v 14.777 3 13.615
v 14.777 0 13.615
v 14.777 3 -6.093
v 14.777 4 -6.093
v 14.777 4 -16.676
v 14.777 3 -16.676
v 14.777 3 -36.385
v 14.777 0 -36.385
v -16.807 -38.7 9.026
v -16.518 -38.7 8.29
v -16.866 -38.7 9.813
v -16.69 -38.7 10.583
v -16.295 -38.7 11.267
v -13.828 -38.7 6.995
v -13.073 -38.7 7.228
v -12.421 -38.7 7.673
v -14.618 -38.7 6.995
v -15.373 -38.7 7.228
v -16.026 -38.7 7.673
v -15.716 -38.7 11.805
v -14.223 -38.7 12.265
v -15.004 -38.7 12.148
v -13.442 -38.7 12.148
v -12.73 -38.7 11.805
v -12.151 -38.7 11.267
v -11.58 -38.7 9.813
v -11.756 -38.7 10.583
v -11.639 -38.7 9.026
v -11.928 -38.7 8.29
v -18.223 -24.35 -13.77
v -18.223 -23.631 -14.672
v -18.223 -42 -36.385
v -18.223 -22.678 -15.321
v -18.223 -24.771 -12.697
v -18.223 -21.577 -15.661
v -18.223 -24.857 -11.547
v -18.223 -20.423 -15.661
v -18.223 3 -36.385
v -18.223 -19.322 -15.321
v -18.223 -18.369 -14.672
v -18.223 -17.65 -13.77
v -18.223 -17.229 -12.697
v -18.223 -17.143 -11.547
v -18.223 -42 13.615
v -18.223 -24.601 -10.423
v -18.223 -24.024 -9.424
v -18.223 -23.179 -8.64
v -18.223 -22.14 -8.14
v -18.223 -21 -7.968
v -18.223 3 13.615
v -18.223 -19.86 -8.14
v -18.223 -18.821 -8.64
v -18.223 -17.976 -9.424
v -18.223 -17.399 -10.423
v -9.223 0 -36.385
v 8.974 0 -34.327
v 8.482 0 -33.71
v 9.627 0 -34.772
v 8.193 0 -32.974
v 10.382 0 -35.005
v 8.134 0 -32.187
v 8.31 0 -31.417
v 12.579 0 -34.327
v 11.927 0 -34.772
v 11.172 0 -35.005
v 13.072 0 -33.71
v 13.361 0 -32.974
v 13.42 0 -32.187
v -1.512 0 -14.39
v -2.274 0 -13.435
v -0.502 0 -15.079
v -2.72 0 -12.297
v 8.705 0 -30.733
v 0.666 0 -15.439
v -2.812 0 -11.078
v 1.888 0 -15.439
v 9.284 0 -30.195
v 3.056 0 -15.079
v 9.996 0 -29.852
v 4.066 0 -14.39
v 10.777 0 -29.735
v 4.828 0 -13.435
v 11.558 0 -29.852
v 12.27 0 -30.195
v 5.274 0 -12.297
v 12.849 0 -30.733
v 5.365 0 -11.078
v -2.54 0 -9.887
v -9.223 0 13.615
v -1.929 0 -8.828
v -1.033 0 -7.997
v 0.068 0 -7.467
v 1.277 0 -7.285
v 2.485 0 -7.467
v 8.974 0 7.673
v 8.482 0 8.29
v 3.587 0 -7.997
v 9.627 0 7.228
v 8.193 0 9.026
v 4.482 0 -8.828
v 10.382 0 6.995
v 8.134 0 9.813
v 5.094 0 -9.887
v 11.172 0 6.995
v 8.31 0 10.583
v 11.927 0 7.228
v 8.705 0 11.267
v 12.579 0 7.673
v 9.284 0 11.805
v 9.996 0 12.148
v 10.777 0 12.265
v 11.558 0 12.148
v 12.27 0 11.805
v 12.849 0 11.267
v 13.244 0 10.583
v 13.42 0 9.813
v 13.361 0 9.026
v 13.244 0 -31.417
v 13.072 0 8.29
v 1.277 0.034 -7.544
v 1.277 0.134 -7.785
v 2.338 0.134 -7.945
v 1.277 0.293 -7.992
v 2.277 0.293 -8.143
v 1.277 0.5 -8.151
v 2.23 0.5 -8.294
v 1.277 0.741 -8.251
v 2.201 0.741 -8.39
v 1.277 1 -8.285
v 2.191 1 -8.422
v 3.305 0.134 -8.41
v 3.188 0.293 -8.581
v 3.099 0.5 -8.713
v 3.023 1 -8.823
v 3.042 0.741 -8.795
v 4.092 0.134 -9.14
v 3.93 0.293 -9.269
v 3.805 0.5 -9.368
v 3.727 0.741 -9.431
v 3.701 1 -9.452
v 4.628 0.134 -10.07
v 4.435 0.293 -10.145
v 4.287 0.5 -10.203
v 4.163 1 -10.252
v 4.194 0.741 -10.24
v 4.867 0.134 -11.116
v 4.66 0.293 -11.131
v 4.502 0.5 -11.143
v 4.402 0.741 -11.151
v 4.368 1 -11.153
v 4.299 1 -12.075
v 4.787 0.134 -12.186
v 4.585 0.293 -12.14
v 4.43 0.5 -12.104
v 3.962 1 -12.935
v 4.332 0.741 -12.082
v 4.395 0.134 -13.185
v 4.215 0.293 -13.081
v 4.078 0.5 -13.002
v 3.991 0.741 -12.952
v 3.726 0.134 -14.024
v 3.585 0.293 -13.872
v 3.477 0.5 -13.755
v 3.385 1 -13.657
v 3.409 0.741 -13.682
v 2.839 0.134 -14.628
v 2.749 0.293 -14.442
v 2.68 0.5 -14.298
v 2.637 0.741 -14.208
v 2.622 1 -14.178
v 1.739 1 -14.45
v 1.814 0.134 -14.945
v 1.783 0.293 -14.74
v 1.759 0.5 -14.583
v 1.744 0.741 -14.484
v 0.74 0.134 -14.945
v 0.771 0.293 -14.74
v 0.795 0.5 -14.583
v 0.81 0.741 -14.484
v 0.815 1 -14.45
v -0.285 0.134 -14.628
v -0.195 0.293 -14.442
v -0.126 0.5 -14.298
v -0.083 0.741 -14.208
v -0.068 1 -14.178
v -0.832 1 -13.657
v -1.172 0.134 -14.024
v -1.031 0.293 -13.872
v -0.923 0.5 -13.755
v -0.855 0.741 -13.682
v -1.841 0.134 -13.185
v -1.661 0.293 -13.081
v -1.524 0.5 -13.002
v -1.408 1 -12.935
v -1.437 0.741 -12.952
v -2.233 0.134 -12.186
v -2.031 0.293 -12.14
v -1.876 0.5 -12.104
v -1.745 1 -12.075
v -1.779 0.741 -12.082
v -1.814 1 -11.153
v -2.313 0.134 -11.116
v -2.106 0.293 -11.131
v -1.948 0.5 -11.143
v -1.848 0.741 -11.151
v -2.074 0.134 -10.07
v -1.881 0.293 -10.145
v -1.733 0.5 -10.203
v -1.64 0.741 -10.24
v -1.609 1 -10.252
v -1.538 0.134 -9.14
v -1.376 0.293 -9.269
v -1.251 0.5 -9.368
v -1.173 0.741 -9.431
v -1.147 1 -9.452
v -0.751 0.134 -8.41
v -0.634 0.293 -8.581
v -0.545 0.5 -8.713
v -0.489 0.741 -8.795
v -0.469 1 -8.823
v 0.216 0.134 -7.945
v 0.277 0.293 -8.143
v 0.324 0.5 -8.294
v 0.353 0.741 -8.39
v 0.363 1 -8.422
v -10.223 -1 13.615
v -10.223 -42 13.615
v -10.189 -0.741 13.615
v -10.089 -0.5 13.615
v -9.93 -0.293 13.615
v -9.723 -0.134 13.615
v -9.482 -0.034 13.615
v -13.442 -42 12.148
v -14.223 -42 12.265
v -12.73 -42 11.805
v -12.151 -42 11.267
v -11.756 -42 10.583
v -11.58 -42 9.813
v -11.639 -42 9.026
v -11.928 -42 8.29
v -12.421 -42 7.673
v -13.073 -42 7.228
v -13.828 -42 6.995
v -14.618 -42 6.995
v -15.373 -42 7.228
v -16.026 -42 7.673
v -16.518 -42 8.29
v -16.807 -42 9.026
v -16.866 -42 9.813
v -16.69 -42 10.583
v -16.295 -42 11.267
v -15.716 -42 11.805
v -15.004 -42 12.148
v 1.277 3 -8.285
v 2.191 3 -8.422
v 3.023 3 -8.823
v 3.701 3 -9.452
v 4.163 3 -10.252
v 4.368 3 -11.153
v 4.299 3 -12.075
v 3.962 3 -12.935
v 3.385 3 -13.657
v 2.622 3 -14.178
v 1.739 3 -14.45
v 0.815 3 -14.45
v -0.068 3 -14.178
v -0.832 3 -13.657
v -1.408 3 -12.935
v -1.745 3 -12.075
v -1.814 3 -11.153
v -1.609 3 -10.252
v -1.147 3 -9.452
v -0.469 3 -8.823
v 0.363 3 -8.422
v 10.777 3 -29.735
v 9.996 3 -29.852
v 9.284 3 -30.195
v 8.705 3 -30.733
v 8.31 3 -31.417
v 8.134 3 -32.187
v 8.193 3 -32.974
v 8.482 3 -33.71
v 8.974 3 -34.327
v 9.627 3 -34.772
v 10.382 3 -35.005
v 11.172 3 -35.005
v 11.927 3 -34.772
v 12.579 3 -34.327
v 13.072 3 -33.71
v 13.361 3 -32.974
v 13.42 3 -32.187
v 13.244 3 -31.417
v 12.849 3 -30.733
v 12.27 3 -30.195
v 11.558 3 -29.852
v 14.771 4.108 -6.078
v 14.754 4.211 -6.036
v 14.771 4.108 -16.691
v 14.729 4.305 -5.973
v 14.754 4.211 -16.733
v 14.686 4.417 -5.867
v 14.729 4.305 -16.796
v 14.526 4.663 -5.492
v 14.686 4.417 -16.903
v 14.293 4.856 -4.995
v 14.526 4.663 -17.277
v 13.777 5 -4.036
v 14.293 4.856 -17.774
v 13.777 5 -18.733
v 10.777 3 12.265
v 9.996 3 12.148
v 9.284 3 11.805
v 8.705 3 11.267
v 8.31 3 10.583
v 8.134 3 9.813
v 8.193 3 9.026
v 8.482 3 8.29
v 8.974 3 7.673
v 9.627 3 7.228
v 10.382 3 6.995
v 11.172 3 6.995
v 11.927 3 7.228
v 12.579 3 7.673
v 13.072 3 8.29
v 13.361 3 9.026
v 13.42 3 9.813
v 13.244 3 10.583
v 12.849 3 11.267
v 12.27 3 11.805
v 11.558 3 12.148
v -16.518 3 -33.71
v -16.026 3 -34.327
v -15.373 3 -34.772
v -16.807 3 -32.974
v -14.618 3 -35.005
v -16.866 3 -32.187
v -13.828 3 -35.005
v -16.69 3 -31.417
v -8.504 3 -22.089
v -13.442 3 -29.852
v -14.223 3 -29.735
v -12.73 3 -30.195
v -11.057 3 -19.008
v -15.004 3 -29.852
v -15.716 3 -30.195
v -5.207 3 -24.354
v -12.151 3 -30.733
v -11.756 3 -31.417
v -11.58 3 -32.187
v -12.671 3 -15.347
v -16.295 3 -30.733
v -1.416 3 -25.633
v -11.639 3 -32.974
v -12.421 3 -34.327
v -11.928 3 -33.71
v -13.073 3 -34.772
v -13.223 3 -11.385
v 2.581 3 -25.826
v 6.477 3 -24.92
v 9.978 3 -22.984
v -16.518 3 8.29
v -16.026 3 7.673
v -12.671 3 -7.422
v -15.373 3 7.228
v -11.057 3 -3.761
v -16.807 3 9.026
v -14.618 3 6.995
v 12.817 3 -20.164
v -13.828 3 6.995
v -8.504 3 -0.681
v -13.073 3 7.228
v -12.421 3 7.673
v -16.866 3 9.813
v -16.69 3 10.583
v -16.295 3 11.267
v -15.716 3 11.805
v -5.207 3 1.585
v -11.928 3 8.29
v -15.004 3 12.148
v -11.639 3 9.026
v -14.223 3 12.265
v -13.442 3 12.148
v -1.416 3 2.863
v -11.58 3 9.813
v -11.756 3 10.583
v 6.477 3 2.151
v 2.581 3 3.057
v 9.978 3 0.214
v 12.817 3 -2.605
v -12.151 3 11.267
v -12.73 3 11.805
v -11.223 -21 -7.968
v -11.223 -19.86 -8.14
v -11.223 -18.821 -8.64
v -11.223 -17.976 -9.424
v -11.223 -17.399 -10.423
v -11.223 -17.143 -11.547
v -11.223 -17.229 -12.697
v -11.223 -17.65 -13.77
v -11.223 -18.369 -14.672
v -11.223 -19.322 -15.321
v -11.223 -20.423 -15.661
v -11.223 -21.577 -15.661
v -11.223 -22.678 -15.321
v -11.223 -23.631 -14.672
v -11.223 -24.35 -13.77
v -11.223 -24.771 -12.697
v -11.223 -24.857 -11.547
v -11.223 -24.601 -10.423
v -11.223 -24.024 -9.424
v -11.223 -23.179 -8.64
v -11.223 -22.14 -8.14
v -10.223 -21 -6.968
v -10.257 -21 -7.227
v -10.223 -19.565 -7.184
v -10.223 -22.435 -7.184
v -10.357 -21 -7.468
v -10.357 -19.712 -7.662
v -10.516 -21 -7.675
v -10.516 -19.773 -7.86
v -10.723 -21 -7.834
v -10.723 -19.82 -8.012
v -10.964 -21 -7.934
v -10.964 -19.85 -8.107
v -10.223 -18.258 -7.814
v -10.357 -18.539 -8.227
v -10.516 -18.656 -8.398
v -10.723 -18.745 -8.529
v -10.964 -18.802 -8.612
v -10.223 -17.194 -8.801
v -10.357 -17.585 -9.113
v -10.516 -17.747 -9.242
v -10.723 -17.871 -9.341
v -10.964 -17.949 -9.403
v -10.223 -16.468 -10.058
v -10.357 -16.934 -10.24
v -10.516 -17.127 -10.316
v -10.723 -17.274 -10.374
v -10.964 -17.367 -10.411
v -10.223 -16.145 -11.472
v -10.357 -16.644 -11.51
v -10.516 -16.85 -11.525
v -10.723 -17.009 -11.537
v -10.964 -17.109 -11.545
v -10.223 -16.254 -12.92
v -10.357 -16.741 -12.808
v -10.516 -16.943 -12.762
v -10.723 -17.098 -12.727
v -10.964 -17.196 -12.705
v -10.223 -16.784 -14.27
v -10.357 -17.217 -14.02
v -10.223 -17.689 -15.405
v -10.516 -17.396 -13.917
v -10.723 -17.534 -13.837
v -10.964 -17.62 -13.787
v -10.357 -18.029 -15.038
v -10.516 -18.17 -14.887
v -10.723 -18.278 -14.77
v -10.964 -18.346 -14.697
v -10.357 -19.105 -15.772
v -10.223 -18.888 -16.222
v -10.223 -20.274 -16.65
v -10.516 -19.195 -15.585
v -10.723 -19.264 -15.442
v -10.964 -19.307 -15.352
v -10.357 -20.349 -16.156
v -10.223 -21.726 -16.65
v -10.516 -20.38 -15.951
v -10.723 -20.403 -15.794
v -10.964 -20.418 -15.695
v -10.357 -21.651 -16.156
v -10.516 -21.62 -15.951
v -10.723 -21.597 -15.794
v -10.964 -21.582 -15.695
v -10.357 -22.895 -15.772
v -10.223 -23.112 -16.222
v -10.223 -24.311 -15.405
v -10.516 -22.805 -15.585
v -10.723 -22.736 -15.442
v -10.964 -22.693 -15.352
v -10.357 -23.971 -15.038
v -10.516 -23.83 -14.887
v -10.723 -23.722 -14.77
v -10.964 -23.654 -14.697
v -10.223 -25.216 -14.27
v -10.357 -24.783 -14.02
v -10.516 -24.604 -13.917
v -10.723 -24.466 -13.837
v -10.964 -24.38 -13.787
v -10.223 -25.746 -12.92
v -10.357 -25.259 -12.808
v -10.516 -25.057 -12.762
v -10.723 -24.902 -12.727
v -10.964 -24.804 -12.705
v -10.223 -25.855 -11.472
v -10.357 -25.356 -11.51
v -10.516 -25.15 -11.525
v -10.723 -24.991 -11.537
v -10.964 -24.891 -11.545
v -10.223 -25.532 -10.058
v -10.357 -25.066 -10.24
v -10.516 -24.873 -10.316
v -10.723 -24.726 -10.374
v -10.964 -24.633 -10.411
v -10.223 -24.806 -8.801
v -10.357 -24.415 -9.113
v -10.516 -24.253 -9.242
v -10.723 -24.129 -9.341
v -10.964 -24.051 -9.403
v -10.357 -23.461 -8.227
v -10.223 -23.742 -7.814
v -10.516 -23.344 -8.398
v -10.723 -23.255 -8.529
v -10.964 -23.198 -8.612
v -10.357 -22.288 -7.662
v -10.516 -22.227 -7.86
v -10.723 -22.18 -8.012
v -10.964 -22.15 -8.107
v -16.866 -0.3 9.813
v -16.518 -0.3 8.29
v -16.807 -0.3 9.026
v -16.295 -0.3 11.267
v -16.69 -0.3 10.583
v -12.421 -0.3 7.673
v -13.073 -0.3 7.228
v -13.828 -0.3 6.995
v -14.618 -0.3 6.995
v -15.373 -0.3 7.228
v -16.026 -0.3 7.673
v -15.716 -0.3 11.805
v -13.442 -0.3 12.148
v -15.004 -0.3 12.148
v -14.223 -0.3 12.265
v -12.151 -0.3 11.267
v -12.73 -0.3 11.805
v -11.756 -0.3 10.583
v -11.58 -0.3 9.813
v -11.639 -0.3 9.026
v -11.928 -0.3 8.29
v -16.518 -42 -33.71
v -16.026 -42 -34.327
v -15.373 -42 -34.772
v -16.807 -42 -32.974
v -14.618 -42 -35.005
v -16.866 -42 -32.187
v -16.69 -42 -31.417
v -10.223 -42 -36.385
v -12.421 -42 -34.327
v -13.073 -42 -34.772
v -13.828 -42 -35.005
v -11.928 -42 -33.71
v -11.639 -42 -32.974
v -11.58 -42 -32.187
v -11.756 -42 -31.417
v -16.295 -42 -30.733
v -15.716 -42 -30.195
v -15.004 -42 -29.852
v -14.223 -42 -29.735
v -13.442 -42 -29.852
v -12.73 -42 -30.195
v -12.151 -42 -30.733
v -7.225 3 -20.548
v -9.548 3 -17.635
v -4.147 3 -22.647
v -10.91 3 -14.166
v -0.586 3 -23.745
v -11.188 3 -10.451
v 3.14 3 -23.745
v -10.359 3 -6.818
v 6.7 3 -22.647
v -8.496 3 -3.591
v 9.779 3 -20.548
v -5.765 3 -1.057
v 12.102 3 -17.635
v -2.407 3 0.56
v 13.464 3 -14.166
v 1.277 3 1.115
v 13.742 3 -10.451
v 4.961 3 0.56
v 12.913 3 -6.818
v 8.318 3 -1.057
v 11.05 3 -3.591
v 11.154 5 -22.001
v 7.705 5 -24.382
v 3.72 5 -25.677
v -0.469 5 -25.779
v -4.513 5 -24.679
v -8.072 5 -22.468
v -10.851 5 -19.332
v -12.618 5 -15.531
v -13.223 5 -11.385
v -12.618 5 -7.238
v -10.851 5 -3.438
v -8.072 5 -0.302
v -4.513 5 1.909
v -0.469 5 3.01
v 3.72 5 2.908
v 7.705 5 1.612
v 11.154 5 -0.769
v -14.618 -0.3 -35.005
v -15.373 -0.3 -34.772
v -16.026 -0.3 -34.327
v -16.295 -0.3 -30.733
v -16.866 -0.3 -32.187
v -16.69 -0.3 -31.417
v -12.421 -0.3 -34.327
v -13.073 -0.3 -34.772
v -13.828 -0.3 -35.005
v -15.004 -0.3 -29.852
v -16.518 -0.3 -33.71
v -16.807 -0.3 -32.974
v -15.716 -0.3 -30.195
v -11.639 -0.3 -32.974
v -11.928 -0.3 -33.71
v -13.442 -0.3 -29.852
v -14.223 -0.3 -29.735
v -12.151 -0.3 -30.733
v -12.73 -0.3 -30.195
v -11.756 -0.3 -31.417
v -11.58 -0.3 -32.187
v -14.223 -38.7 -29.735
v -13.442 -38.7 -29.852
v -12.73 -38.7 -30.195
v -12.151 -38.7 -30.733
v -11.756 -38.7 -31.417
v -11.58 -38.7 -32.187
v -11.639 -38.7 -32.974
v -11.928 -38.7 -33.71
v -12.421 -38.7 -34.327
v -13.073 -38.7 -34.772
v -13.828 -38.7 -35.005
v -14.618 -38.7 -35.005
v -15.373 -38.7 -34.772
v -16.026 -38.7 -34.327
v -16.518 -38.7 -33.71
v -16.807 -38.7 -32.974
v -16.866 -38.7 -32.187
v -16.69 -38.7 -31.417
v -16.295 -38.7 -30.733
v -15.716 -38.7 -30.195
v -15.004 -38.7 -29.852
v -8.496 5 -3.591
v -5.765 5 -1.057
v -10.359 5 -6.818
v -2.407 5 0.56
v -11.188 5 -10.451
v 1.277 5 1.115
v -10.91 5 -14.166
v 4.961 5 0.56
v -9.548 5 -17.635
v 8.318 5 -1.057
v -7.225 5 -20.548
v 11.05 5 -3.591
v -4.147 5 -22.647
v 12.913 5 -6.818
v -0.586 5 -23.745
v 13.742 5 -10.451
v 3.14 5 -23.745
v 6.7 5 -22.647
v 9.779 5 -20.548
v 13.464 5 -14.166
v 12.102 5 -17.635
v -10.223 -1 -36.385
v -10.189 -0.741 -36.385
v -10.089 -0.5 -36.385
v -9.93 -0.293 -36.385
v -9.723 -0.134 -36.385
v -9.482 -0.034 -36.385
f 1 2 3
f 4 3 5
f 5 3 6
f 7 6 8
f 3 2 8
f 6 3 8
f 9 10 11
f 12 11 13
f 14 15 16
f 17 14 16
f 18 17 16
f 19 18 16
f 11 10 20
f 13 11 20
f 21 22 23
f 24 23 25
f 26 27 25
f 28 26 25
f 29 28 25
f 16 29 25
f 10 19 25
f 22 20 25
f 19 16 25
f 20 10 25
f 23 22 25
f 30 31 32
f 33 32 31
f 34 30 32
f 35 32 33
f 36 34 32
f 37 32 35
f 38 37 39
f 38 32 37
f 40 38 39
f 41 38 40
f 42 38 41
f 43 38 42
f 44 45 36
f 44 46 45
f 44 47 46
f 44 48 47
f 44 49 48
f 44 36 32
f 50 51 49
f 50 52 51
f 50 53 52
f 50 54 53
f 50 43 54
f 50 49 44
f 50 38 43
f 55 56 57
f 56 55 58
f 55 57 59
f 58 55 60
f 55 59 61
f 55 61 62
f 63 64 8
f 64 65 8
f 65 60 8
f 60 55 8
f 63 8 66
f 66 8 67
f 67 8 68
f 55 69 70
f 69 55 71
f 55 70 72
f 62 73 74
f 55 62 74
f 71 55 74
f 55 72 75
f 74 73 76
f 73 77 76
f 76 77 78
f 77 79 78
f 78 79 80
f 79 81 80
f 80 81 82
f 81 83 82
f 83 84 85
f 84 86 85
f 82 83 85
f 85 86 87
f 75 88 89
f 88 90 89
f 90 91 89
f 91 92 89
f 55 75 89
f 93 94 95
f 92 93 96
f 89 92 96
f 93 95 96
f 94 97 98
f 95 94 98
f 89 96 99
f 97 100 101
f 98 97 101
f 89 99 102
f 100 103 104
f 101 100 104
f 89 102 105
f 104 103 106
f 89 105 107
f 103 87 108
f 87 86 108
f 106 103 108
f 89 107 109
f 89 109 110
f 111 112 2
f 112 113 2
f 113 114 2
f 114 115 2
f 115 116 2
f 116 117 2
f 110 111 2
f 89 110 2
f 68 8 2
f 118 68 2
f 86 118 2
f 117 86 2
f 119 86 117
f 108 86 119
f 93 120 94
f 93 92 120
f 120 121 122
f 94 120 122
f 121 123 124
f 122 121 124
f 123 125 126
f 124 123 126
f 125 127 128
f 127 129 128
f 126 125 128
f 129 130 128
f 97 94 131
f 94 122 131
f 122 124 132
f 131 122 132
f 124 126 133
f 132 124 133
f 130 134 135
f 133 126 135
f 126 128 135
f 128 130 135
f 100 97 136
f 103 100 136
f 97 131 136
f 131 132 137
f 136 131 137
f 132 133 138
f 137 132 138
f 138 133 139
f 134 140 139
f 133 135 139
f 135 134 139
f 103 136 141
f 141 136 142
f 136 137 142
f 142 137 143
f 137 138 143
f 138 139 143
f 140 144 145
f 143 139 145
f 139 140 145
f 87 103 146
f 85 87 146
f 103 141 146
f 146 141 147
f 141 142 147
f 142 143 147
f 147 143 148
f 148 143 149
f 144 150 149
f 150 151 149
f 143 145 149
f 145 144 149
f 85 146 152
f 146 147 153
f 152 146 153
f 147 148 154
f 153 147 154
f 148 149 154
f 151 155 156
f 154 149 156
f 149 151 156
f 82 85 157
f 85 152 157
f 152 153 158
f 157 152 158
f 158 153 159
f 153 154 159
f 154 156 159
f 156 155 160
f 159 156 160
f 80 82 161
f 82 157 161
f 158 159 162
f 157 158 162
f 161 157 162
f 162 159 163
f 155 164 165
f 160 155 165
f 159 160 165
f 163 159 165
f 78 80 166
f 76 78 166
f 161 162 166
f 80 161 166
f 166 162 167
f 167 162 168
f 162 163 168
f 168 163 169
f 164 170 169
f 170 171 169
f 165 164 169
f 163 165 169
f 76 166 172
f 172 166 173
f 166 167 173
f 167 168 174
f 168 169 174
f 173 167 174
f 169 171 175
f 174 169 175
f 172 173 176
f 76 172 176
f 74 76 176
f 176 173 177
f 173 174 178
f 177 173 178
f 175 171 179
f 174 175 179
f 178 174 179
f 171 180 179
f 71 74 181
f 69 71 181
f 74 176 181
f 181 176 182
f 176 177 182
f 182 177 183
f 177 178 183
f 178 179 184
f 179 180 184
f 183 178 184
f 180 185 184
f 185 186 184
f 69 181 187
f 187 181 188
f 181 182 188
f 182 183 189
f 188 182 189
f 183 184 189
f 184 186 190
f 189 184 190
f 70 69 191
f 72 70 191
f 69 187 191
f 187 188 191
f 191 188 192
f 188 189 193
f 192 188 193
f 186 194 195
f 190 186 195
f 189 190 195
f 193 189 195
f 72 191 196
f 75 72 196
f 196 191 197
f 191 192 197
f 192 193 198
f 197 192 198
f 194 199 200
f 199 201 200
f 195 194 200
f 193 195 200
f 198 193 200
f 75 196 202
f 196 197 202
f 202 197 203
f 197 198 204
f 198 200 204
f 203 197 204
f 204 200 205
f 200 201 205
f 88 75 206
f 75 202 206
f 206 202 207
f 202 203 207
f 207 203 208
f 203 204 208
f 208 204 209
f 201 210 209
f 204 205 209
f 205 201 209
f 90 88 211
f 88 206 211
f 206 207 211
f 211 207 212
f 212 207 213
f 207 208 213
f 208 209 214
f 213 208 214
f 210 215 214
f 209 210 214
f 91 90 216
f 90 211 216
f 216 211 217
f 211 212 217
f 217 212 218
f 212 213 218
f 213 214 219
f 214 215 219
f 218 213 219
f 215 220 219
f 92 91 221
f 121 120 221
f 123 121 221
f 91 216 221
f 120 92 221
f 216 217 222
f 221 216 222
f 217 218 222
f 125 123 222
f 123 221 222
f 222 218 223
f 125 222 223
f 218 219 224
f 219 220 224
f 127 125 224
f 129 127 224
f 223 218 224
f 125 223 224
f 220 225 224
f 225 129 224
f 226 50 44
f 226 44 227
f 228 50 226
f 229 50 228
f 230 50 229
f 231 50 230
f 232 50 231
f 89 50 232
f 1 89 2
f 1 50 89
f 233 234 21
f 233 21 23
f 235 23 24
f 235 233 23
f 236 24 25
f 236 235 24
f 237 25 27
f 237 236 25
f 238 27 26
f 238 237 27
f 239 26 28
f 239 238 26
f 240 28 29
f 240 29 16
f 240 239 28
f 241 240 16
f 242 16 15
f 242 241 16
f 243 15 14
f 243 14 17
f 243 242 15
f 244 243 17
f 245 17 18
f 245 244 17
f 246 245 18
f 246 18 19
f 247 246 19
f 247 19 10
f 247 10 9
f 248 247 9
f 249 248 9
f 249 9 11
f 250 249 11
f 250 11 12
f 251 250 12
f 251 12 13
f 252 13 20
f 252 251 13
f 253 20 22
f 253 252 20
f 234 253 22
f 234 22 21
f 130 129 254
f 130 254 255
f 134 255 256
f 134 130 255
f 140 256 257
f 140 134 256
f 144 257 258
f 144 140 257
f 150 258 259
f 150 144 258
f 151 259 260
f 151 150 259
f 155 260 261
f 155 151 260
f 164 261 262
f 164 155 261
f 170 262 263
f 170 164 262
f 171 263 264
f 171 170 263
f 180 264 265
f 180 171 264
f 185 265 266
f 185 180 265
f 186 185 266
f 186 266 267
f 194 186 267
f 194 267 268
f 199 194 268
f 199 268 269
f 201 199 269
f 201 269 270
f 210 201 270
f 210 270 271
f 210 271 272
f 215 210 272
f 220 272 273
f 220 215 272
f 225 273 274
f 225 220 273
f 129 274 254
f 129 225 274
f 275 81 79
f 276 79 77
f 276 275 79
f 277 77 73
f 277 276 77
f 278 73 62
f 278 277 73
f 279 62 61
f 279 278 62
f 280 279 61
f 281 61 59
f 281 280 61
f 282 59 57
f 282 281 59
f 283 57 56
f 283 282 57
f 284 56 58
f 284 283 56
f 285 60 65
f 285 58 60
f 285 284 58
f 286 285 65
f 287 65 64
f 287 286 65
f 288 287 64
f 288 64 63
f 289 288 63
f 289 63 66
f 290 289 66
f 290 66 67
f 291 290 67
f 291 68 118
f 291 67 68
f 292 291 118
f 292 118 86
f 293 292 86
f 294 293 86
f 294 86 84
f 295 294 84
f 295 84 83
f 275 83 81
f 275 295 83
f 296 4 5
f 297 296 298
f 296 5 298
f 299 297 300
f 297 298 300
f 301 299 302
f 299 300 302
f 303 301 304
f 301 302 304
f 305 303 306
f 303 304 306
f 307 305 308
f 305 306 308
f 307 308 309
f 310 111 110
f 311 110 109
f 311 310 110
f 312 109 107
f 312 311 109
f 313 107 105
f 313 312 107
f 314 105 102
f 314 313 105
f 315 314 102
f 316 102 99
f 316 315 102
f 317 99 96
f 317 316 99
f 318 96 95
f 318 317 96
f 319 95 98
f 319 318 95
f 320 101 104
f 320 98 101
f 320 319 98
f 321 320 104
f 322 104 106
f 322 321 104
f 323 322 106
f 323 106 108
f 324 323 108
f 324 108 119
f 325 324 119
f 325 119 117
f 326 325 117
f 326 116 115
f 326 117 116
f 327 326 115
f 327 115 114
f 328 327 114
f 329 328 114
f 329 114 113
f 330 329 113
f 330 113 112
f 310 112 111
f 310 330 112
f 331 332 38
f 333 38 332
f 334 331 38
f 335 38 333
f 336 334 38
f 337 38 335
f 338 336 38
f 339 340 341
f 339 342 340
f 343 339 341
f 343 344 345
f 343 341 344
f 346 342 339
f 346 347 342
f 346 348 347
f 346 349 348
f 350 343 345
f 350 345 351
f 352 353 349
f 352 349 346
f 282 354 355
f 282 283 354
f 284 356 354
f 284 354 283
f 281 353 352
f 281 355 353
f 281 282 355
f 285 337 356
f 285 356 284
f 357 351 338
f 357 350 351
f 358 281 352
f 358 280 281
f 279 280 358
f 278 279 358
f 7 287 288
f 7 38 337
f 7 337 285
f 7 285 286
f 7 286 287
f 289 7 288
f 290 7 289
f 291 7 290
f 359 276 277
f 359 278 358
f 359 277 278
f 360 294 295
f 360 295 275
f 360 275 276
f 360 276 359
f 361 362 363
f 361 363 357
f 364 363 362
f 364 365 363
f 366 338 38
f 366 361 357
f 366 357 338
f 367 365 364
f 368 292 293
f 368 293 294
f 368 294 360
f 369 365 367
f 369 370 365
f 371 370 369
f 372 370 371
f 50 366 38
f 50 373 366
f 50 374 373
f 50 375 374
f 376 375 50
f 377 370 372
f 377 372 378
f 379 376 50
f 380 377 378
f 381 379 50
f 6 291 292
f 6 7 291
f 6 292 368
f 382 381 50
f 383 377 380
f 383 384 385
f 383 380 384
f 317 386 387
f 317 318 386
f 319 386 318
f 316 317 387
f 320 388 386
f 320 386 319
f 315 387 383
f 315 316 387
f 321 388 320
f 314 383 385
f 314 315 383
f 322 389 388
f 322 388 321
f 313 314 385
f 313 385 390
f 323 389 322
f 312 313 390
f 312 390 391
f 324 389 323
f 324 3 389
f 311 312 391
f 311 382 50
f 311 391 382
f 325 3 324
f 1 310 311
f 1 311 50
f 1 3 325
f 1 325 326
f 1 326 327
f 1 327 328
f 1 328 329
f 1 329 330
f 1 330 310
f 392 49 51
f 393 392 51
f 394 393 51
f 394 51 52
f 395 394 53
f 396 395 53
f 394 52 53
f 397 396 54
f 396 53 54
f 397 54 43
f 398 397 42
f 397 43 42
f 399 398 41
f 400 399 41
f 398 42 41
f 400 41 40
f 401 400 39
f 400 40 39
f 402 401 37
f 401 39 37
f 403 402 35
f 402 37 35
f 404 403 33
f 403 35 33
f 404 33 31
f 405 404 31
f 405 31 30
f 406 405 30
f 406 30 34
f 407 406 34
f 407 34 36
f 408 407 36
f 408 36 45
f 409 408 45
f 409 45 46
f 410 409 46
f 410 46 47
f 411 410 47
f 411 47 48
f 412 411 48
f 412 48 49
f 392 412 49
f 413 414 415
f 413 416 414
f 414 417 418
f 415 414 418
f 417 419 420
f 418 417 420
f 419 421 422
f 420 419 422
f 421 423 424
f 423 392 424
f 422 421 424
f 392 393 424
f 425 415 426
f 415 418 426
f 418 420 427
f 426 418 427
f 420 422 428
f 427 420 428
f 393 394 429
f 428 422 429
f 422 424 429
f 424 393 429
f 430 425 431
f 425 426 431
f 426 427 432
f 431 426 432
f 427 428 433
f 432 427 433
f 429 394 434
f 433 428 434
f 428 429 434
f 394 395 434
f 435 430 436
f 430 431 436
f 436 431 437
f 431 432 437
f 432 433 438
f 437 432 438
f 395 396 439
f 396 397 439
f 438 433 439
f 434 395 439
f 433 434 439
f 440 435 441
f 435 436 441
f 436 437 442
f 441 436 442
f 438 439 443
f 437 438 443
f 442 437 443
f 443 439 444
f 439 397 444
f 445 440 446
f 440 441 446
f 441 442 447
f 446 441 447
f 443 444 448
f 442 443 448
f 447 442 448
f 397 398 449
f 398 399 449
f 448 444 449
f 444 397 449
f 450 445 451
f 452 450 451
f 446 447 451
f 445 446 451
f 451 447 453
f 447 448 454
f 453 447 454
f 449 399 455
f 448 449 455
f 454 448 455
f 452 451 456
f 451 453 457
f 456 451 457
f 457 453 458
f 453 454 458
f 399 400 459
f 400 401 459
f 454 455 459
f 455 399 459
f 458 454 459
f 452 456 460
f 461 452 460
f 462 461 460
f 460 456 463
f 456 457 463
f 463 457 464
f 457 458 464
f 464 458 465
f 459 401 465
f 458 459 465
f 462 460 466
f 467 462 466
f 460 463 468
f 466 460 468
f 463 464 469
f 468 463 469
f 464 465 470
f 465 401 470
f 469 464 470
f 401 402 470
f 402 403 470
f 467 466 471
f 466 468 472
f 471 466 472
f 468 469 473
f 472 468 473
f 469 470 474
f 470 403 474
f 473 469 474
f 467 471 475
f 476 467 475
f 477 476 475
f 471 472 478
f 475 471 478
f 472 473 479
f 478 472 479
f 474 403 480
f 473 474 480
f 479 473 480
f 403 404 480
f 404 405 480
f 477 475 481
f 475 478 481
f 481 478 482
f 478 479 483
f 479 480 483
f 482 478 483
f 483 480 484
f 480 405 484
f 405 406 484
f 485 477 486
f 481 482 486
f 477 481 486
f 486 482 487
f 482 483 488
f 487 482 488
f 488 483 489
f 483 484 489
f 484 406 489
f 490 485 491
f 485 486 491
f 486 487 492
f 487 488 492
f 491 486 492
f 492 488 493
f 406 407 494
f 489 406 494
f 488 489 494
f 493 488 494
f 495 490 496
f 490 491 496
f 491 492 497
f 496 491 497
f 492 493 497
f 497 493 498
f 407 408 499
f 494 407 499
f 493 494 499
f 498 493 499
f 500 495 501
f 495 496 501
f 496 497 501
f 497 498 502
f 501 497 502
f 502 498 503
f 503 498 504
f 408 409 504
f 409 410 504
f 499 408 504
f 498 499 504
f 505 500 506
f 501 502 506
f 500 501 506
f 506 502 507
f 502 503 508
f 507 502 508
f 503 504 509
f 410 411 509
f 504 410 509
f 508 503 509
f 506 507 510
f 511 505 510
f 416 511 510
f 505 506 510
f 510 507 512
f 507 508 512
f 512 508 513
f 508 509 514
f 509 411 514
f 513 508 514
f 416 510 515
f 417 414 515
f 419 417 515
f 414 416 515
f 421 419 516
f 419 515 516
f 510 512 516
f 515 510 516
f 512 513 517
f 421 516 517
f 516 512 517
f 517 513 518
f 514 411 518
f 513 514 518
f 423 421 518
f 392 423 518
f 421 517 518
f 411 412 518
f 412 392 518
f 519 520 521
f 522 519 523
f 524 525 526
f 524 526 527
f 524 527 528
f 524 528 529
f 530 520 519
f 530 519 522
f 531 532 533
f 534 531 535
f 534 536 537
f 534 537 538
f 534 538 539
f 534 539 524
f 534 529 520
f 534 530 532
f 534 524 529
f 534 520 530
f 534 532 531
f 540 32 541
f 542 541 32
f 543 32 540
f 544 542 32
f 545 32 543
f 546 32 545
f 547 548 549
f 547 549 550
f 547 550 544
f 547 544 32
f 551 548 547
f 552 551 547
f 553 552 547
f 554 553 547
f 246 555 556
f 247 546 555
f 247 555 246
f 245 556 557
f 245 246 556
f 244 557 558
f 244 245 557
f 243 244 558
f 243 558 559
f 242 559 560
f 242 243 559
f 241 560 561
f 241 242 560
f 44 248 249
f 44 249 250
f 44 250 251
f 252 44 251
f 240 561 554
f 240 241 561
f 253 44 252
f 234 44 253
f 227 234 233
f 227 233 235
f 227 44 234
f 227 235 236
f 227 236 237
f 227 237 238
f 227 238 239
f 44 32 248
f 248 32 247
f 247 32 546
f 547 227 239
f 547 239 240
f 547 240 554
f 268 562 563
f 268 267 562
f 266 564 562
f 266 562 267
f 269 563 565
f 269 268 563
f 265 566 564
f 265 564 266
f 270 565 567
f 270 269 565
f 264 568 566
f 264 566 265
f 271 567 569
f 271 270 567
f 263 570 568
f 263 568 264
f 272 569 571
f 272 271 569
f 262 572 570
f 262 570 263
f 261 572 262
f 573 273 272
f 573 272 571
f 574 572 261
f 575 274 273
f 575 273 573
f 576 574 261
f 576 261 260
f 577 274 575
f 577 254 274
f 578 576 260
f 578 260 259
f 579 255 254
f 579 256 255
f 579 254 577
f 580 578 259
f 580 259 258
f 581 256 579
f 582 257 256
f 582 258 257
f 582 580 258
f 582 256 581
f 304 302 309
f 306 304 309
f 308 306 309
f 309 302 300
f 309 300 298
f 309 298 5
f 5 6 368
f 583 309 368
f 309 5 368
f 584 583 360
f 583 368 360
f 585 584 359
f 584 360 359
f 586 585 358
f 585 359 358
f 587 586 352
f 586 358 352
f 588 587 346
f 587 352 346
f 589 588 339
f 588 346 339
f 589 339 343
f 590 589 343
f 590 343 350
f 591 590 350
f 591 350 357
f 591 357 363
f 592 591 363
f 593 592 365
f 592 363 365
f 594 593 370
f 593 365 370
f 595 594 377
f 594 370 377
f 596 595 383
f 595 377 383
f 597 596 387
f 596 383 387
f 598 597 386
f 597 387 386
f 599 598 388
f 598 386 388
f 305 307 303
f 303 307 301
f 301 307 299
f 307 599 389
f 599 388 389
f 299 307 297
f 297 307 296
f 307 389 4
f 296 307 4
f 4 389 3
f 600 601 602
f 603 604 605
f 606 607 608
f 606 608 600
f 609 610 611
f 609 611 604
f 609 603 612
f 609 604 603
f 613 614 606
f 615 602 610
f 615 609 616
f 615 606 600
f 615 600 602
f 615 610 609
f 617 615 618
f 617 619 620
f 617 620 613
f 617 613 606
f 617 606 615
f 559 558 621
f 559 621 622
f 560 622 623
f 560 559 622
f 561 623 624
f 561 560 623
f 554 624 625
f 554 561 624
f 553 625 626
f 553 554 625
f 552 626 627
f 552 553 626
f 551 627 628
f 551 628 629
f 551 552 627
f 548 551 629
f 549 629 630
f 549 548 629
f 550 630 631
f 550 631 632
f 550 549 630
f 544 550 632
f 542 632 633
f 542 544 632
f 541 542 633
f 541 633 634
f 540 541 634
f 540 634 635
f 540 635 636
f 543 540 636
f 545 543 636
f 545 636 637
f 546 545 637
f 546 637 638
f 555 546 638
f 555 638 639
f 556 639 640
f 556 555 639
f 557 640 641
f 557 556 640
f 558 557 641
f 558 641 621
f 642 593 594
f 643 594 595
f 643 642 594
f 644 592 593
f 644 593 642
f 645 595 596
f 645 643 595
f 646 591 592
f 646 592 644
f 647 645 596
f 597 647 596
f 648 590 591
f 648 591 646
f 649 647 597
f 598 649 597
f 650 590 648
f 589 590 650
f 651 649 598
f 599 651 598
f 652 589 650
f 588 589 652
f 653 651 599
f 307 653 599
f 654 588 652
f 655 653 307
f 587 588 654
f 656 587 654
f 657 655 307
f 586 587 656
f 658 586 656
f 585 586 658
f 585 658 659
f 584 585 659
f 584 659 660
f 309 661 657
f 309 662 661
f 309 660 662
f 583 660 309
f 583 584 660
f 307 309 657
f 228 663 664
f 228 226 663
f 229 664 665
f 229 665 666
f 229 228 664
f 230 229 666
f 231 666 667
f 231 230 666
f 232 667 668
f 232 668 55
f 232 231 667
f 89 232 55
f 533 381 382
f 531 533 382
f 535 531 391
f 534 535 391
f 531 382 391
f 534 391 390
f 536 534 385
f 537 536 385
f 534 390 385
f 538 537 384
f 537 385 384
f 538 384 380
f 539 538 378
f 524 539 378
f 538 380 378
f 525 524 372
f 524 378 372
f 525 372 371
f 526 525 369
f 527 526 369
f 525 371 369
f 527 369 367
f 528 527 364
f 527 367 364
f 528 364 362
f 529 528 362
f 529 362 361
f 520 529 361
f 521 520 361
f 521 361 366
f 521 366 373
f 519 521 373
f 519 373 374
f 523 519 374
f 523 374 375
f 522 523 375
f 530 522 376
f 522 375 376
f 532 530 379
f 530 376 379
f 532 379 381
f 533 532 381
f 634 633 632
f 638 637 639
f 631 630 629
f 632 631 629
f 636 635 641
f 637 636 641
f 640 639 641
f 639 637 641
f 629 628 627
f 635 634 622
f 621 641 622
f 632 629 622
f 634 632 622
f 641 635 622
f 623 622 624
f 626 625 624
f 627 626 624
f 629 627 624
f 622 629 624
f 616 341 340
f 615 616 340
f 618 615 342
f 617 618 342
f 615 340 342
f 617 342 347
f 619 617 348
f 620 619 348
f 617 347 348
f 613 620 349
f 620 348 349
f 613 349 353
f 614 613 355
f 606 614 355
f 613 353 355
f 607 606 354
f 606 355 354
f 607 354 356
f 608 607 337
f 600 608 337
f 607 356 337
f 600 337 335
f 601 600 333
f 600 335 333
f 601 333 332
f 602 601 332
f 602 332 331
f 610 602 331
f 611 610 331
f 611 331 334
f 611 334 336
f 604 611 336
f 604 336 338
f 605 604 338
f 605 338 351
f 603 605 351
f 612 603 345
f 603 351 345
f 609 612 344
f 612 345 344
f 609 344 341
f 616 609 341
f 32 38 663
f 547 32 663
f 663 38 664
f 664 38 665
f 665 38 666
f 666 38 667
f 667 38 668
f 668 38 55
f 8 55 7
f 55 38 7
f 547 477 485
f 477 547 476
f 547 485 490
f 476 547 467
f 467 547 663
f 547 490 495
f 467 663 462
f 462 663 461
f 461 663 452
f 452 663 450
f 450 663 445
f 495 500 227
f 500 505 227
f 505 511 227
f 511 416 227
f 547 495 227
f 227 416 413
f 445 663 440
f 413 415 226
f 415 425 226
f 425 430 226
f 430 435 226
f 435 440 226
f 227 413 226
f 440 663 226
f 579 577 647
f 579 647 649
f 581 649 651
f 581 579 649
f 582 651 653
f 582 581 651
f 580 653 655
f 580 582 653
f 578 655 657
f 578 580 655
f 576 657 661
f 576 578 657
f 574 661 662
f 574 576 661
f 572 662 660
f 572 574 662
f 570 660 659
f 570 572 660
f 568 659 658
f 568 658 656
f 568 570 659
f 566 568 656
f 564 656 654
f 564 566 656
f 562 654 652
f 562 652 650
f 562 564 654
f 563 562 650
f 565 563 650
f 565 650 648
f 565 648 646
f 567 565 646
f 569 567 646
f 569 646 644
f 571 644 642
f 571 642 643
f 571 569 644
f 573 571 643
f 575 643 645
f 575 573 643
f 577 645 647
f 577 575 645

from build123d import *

# Parameters (mm, degrees)
SKETCH1_W           = 25
SKETCH1_H           = 50
SKETCH1_R           = 3.1
BOSS_EXTRUDE1_DEPTH = 3
SKETCH2_W           = 50
SKETCH2_H           = 3
BOSS_EXTRUDE2_DEPTH = 8
SKETCH3_W           = 8
SKETCH3_H           = 50
BOSS_EXTRUDE3_DEPTH = 42
SKETCH4_R           = 2.65
CUT_EXTRUDE1_DEPTH  = 3.3
FILLET1_R           = 1
SKETCH5_R           = 3.868246804
CUT_EXTRUDE2_DEPTH  = 9
FILLET2_R           = 1
SKETCH6_R           = 12.5
BOSS_EXTRUDE4_DEPTH = 2
FILLET3_R           = 1
FILLET4_R           = 1


with BuildPart() as part:
    # Sketch1 → Boss-Extrude1 (new body)
    with BuildSketch(Plane(origin=(0, 0, 0), x_dir=(1, 0, 0), z_dir=(0, 1, 0))):
        with Locations((2.276951673, 11.384758364)):
            Rectangle(SKETCH1_W, SKETCH1_H)
        with Locations(Location((1.276951673, 11.384758364, 0), (0, 0, 270))):
            Circle(SKETCH1_R, mode=Mode.SUBTRACT)
    extrude(amount=BOSS_EXTRUDE1_DEPTH)

    # Sketch2 → Boss-Extrude2 (add)
    with BuildSketch(Plane.ZY.offset(10.223048327)):
        with Locations((-11.384758364, 1.5)):
            Rectangle(SKETCH2_W, SKETCH2_H)
    extrude(amount=BOSS_EXTRUDE2_DEPTH)

    # Sketch3 → Boss-Extrude3 (add)
    with BuildSketch(Plane.XZ):
        with Locations((-14.223048327, -11.384758364)):
            Rectangle(SKETCH3_W, SKETCH3_H)
    extrude(amount=BOSS_EXTRUDE3_DEPTH)

    # Sketch4 → Cut-Extrude1 (cut)
    with BuildSketch(Plane(origin=(0, 3, 0), x_dir=(1, 0, 0), z_dir=(0, 1, 0))):
        with Locations(Location((-14.223048327, 32.384758364, 0), (0, 0, 270))):
            Circle(SKETCH4_R)
        with Locations(Location((-14.223048327, -9.615241636, 0), (0, 0, 270))):
            Circle(SKETCH4_R)
    cut_extrude1 = extrude(amount=-CUT_EXTRUDE1_DEPTH, mode=Mode.SUBTRACT)

    # Mirror1: Cut-Extrude1 across plane
    add(cut_extrude1.mirror(Plane.ZX.offset(-19.5)), mode=Mode.SUBTRACT)

    # Fillet1
    fillet1_edges = [part.edges().sort_by_distance(p)[0] for p in [
        (1.276951673, 0, -14.484758364),
    ]]
    fillet(fillet1_edges, radius=FILLET1_R)

    # Sketch5 → Cut-Extrude2 (cut)
    with BuildSketch(Plane.ZY.offset(18.223048327)):
        with Locations((-11.836279124, -21)):
            Circle(SKETCH5_R)
    extrude(amount=-CUT_EXTRUDE2_DEPTH, mode=Mode.SUBTRACT)

    # Fillet2
    fillet2_edges = [part.edges().sort_by_distance(p)[0] for p in [
        (-10.223048327, -21, -15.704525928),
    ]]
    fillet(fillet2_edges, radius=FILLET2_R)

    # Mirror2: Cut-Extrude1 across plane
    add(cut_extrude1.mirror(Plane.ZY.offset(1.723048327)), mode=Mode.SUBTRACT)

    # Sketch6 → Boss-Extrude4 (add)
    with BuildSketch(Plane(origin=(0, 3, 0), x_dir=(1, 0, 0), z_dir=(0, 1, 0))):
        with BuildLine():
            Line((14.776951673, 6.093255742), (14.776951673, 16.676260986))
            ThreePointArc((14.776951673, 16.676260986), (-13.223048327, 11.384758364), (14.776951673, 6.093255742))
        make_face()
        with Locations(Location((1.276951673, 11.384758364, 0), (0, 0, 270))):
            Circle(SKETCH6_R, mode=Mode.SUBTRACT)
    extrude(amount=BOSS_EXTRUDE4_DEPTH)

    # Fillet3
    fillet3_edges = [part.edges().sort_by_distance(p)[0] for p in [
        (-10.223048327, 0, -11.384758364),
    ]]
    fillet(fillet3_edges, radius=FILLET3_R)

    # Fillet4
    fillet4_edges = [part.edges().sort_by_distance(p)[0] for p in [
        (14.776951673, 5, -11.384758364),
    ]]
    fillet(fillet4_edges, radius=FILLET4_R - 0.0001)  # a hair under: the kernel refuses the full size


solid = part.part
